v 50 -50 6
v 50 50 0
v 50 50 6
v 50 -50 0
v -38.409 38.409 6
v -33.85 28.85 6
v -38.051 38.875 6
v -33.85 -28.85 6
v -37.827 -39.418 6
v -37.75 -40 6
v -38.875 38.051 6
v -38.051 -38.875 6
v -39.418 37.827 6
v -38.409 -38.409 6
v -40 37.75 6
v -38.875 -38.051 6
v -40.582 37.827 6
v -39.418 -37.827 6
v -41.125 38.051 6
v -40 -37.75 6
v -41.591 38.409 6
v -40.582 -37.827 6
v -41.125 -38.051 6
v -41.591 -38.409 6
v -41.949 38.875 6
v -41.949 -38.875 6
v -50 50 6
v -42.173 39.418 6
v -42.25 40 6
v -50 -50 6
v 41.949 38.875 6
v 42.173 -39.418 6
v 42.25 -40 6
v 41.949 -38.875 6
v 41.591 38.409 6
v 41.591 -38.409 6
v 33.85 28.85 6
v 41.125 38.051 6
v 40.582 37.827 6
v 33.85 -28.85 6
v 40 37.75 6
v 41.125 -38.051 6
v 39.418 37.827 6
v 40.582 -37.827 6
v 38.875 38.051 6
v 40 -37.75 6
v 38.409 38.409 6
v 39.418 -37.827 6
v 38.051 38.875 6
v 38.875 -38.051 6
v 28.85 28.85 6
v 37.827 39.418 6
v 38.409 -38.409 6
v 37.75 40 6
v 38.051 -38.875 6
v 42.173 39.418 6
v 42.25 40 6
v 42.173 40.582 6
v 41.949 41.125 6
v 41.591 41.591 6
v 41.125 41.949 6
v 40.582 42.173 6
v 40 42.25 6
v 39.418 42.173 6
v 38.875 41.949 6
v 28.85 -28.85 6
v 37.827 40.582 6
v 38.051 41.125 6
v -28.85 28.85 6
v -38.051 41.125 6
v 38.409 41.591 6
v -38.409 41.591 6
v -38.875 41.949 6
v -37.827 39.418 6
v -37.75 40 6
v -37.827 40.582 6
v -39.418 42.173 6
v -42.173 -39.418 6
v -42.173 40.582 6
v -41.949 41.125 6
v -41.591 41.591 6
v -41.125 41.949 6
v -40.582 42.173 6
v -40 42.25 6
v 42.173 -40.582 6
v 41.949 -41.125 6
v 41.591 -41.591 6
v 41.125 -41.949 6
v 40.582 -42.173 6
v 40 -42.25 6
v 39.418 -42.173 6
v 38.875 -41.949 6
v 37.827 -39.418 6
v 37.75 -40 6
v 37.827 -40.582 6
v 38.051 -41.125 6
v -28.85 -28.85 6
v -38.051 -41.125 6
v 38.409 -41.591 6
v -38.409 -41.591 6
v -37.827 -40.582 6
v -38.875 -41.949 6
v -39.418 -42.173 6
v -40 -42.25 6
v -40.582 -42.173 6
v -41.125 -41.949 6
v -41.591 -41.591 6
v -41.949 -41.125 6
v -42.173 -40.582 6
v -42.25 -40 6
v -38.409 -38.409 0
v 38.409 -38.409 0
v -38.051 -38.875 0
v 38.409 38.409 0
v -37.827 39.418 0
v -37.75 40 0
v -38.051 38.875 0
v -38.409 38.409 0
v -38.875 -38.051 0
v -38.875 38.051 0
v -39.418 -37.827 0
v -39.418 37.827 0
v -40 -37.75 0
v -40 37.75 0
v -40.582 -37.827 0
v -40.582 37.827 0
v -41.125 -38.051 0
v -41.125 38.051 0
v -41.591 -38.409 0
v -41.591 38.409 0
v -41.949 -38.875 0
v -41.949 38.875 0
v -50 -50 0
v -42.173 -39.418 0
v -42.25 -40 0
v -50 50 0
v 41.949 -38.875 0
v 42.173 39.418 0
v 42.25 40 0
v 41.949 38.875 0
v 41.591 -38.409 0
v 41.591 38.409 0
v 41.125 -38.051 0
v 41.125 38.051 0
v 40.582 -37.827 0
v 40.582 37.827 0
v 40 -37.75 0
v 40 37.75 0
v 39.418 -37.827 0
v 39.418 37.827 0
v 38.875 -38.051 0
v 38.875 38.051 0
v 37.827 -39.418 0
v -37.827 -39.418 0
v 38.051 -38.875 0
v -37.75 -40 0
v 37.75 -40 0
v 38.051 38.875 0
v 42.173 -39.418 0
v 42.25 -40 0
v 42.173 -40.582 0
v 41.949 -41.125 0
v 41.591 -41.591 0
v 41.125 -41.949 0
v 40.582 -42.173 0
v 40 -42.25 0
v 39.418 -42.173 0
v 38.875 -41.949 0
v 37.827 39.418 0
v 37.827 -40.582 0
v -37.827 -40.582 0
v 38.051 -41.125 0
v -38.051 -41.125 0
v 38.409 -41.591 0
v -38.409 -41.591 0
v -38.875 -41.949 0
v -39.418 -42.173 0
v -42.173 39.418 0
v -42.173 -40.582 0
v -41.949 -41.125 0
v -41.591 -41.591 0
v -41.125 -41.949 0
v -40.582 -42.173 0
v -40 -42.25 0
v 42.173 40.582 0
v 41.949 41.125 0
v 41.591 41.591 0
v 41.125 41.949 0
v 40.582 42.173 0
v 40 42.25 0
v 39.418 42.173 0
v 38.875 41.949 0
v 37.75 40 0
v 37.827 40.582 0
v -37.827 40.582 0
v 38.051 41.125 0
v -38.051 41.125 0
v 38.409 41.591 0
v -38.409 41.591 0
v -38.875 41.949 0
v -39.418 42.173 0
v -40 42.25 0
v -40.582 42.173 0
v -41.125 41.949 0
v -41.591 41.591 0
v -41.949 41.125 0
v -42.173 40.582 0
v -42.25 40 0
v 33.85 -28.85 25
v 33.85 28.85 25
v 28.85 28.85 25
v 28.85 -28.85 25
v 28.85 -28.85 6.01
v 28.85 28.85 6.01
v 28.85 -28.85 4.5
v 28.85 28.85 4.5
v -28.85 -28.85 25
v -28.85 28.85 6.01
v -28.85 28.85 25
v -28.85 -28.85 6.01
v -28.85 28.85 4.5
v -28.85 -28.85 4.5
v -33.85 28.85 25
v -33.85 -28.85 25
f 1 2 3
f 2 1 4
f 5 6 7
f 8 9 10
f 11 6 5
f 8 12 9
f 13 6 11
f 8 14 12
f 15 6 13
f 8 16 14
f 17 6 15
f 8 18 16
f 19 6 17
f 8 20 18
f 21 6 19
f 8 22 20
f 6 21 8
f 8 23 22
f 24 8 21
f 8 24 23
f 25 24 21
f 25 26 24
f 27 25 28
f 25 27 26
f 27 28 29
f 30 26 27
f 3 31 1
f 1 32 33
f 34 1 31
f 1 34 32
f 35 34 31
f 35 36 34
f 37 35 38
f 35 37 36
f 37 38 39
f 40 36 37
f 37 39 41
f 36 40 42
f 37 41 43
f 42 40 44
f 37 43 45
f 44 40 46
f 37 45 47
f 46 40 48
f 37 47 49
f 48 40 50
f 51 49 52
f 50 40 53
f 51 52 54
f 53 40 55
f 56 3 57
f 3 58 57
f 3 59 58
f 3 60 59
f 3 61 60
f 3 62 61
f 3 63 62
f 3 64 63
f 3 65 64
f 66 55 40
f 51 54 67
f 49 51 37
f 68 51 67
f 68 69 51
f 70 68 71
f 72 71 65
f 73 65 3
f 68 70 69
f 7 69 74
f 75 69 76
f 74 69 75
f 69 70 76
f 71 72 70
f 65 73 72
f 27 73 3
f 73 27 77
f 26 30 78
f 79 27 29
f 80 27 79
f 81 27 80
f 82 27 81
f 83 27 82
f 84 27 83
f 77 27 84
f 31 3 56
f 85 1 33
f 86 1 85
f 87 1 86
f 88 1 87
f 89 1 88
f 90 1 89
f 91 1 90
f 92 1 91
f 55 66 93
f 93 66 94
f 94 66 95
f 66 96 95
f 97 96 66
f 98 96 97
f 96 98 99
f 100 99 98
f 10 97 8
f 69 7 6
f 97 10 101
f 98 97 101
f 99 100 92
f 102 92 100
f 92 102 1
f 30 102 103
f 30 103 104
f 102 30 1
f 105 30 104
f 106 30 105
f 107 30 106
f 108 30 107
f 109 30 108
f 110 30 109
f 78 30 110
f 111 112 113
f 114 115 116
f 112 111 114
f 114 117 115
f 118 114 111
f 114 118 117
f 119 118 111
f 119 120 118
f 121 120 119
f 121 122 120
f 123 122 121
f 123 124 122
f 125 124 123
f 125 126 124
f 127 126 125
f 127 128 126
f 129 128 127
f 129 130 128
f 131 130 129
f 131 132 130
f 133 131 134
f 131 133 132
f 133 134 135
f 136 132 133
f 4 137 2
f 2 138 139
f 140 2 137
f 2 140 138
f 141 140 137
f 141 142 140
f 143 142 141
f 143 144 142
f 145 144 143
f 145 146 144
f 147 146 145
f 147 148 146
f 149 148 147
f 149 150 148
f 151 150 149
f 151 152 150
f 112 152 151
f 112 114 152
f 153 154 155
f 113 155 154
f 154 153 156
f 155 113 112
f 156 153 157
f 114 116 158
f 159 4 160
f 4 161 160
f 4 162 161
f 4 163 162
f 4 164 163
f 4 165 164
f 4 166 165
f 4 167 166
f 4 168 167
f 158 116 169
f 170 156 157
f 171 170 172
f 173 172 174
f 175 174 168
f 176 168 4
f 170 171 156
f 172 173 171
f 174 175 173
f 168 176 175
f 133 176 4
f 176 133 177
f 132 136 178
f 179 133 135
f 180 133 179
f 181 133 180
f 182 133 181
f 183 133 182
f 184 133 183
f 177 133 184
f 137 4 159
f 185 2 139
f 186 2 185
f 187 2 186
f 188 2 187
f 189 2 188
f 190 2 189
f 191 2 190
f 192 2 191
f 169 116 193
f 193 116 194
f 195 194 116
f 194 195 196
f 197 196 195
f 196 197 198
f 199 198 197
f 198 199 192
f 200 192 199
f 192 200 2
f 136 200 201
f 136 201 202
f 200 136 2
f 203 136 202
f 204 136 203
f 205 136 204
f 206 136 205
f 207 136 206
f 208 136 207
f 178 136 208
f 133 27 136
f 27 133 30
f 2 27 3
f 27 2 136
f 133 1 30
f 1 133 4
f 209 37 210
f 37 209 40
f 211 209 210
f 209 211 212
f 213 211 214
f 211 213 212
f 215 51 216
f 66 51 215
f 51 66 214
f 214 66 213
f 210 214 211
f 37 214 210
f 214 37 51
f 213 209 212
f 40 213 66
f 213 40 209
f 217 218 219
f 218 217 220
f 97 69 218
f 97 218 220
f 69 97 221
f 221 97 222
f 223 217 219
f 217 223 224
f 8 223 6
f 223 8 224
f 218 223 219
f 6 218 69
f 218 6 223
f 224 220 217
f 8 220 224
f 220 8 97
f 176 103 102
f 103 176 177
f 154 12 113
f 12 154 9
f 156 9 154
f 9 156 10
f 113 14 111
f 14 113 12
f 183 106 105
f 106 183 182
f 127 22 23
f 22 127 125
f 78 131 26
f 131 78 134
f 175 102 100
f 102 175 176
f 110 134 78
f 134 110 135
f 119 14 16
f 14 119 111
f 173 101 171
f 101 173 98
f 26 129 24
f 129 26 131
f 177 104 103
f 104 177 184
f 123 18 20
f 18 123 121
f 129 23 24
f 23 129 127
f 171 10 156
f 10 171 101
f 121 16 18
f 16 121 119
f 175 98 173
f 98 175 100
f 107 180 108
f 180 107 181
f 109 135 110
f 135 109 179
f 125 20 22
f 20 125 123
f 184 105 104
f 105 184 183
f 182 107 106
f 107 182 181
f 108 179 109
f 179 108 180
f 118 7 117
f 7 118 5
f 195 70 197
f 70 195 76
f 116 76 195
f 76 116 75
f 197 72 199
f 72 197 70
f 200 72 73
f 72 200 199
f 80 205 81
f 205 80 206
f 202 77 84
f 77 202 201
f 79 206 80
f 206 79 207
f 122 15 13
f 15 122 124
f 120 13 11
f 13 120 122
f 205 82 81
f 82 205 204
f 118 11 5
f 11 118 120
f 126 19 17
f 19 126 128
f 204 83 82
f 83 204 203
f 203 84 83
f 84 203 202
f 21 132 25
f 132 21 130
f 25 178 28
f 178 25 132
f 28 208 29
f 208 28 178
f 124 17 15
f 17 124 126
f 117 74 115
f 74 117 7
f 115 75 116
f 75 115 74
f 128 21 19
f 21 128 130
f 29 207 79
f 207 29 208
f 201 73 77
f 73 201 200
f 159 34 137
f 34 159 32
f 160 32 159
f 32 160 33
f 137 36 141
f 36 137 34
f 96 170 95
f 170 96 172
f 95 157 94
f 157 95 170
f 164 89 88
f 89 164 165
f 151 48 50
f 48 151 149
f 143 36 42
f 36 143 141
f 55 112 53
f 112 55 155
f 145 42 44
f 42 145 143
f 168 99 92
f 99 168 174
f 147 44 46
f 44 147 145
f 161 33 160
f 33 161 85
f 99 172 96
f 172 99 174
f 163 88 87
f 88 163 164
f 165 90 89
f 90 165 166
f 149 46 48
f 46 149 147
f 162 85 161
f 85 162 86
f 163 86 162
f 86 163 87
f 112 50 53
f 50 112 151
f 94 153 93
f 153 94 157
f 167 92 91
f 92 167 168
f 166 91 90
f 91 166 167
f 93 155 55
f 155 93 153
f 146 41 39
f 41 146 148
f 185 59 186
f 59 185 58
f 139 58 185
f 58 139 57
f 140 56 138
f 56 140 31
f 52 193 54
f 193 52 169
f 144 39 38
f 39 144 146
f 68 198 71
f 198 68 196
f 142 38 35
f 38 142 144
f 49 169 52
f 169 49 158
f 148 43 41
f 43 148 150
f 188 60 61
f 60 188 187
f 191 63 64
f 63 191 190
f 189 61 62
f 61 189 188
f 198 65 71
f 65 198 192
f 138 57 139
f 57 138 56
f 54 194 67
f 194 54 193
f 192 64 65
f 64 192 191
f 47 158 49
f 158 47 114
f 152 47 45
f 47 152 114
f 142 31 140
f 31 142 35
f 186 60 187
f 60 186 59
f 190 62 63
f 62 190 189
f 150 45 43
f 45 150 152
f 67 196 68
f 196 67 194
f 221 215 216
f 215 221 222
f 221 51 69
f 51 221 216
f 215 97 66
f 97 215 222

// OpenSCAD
// cube_tray.scad —— 单手推层用的浅托盘（只卡住魔方最下层）
//
// 用法：改下面参数 → Render (F6) → 导出 STL。
// 说明：
//   * 内口 57.7 mm（57 + 0.35×2），深 19 mm，只卡 D 层；
//   * 左/右两片夹壁，前/后开口，给手指/拇指让位；
//   * 底部 1.5 mm 凹槽，贴硅胶垫；夹壁内侧可再贴 0.5 mm 硅胶；
//   * 打印后把夹壁上缘用砂纸倒 1–2 mm 角，方便魔方落进去。
//
// 打印：PETG/PLA，4 圈壁厚，30% 填充；底面朝下，不用支撑。

cube   = 57.0;   // 魔方边长
gap    = 0.35;   // 单边间隙
layer  = 19.0;   // 一层高度（只卡最下层）
wall   = 5.0;    // 夹壁厚度
base_t = 6.0;    // 底板厚度
pad_t  = 1.5;    // 硅胶垫厚度（底部凹槽）
plate  = 100.0;  // 底板边长

inner = cube + 2 * gap;          // 57.7
outer = inner + 2 * wall;        // 67.7

module jaw(side = 1) {
    // side = 1 右夹壁，-1 左夹壁
    x = side > 0 ? inner / 2 : -inner / 2 - wall;
    translate([x, -inner / 2, base_t])
        cube([wall, inner, layer]);
}

difference() {
    union() {
        // 底板
        translate([-plate / 2, -plate / 2, 0])
            cube([plate, plate, base_t]);
        // 左/右夹壁（前/后不封口）
        jaw(1);
        jaw(-1);
    }

    // 底部硅胶垫凹槽（57.7 × 57.7 × 1.5）
    translate([-inner / 2, -inner / 2, base_t - pad_t])
        cube([inner, inner, pad_t + 0.01]);

    // 4 × M4 固定孔
    for (x = [-40, 40], y = [-40, 40])
        translate([x, y, -1])
            cylinder(d = 4.5, h = base_t + 2, $fn = 24);
}

// 夹壁内侧先不加东西；如果推层时魔方打滑，再贴 0.2 mm 防滑胶带
// （槽口单边间隙只有 0.35 mm，贴厚了魔方放不进去）。
